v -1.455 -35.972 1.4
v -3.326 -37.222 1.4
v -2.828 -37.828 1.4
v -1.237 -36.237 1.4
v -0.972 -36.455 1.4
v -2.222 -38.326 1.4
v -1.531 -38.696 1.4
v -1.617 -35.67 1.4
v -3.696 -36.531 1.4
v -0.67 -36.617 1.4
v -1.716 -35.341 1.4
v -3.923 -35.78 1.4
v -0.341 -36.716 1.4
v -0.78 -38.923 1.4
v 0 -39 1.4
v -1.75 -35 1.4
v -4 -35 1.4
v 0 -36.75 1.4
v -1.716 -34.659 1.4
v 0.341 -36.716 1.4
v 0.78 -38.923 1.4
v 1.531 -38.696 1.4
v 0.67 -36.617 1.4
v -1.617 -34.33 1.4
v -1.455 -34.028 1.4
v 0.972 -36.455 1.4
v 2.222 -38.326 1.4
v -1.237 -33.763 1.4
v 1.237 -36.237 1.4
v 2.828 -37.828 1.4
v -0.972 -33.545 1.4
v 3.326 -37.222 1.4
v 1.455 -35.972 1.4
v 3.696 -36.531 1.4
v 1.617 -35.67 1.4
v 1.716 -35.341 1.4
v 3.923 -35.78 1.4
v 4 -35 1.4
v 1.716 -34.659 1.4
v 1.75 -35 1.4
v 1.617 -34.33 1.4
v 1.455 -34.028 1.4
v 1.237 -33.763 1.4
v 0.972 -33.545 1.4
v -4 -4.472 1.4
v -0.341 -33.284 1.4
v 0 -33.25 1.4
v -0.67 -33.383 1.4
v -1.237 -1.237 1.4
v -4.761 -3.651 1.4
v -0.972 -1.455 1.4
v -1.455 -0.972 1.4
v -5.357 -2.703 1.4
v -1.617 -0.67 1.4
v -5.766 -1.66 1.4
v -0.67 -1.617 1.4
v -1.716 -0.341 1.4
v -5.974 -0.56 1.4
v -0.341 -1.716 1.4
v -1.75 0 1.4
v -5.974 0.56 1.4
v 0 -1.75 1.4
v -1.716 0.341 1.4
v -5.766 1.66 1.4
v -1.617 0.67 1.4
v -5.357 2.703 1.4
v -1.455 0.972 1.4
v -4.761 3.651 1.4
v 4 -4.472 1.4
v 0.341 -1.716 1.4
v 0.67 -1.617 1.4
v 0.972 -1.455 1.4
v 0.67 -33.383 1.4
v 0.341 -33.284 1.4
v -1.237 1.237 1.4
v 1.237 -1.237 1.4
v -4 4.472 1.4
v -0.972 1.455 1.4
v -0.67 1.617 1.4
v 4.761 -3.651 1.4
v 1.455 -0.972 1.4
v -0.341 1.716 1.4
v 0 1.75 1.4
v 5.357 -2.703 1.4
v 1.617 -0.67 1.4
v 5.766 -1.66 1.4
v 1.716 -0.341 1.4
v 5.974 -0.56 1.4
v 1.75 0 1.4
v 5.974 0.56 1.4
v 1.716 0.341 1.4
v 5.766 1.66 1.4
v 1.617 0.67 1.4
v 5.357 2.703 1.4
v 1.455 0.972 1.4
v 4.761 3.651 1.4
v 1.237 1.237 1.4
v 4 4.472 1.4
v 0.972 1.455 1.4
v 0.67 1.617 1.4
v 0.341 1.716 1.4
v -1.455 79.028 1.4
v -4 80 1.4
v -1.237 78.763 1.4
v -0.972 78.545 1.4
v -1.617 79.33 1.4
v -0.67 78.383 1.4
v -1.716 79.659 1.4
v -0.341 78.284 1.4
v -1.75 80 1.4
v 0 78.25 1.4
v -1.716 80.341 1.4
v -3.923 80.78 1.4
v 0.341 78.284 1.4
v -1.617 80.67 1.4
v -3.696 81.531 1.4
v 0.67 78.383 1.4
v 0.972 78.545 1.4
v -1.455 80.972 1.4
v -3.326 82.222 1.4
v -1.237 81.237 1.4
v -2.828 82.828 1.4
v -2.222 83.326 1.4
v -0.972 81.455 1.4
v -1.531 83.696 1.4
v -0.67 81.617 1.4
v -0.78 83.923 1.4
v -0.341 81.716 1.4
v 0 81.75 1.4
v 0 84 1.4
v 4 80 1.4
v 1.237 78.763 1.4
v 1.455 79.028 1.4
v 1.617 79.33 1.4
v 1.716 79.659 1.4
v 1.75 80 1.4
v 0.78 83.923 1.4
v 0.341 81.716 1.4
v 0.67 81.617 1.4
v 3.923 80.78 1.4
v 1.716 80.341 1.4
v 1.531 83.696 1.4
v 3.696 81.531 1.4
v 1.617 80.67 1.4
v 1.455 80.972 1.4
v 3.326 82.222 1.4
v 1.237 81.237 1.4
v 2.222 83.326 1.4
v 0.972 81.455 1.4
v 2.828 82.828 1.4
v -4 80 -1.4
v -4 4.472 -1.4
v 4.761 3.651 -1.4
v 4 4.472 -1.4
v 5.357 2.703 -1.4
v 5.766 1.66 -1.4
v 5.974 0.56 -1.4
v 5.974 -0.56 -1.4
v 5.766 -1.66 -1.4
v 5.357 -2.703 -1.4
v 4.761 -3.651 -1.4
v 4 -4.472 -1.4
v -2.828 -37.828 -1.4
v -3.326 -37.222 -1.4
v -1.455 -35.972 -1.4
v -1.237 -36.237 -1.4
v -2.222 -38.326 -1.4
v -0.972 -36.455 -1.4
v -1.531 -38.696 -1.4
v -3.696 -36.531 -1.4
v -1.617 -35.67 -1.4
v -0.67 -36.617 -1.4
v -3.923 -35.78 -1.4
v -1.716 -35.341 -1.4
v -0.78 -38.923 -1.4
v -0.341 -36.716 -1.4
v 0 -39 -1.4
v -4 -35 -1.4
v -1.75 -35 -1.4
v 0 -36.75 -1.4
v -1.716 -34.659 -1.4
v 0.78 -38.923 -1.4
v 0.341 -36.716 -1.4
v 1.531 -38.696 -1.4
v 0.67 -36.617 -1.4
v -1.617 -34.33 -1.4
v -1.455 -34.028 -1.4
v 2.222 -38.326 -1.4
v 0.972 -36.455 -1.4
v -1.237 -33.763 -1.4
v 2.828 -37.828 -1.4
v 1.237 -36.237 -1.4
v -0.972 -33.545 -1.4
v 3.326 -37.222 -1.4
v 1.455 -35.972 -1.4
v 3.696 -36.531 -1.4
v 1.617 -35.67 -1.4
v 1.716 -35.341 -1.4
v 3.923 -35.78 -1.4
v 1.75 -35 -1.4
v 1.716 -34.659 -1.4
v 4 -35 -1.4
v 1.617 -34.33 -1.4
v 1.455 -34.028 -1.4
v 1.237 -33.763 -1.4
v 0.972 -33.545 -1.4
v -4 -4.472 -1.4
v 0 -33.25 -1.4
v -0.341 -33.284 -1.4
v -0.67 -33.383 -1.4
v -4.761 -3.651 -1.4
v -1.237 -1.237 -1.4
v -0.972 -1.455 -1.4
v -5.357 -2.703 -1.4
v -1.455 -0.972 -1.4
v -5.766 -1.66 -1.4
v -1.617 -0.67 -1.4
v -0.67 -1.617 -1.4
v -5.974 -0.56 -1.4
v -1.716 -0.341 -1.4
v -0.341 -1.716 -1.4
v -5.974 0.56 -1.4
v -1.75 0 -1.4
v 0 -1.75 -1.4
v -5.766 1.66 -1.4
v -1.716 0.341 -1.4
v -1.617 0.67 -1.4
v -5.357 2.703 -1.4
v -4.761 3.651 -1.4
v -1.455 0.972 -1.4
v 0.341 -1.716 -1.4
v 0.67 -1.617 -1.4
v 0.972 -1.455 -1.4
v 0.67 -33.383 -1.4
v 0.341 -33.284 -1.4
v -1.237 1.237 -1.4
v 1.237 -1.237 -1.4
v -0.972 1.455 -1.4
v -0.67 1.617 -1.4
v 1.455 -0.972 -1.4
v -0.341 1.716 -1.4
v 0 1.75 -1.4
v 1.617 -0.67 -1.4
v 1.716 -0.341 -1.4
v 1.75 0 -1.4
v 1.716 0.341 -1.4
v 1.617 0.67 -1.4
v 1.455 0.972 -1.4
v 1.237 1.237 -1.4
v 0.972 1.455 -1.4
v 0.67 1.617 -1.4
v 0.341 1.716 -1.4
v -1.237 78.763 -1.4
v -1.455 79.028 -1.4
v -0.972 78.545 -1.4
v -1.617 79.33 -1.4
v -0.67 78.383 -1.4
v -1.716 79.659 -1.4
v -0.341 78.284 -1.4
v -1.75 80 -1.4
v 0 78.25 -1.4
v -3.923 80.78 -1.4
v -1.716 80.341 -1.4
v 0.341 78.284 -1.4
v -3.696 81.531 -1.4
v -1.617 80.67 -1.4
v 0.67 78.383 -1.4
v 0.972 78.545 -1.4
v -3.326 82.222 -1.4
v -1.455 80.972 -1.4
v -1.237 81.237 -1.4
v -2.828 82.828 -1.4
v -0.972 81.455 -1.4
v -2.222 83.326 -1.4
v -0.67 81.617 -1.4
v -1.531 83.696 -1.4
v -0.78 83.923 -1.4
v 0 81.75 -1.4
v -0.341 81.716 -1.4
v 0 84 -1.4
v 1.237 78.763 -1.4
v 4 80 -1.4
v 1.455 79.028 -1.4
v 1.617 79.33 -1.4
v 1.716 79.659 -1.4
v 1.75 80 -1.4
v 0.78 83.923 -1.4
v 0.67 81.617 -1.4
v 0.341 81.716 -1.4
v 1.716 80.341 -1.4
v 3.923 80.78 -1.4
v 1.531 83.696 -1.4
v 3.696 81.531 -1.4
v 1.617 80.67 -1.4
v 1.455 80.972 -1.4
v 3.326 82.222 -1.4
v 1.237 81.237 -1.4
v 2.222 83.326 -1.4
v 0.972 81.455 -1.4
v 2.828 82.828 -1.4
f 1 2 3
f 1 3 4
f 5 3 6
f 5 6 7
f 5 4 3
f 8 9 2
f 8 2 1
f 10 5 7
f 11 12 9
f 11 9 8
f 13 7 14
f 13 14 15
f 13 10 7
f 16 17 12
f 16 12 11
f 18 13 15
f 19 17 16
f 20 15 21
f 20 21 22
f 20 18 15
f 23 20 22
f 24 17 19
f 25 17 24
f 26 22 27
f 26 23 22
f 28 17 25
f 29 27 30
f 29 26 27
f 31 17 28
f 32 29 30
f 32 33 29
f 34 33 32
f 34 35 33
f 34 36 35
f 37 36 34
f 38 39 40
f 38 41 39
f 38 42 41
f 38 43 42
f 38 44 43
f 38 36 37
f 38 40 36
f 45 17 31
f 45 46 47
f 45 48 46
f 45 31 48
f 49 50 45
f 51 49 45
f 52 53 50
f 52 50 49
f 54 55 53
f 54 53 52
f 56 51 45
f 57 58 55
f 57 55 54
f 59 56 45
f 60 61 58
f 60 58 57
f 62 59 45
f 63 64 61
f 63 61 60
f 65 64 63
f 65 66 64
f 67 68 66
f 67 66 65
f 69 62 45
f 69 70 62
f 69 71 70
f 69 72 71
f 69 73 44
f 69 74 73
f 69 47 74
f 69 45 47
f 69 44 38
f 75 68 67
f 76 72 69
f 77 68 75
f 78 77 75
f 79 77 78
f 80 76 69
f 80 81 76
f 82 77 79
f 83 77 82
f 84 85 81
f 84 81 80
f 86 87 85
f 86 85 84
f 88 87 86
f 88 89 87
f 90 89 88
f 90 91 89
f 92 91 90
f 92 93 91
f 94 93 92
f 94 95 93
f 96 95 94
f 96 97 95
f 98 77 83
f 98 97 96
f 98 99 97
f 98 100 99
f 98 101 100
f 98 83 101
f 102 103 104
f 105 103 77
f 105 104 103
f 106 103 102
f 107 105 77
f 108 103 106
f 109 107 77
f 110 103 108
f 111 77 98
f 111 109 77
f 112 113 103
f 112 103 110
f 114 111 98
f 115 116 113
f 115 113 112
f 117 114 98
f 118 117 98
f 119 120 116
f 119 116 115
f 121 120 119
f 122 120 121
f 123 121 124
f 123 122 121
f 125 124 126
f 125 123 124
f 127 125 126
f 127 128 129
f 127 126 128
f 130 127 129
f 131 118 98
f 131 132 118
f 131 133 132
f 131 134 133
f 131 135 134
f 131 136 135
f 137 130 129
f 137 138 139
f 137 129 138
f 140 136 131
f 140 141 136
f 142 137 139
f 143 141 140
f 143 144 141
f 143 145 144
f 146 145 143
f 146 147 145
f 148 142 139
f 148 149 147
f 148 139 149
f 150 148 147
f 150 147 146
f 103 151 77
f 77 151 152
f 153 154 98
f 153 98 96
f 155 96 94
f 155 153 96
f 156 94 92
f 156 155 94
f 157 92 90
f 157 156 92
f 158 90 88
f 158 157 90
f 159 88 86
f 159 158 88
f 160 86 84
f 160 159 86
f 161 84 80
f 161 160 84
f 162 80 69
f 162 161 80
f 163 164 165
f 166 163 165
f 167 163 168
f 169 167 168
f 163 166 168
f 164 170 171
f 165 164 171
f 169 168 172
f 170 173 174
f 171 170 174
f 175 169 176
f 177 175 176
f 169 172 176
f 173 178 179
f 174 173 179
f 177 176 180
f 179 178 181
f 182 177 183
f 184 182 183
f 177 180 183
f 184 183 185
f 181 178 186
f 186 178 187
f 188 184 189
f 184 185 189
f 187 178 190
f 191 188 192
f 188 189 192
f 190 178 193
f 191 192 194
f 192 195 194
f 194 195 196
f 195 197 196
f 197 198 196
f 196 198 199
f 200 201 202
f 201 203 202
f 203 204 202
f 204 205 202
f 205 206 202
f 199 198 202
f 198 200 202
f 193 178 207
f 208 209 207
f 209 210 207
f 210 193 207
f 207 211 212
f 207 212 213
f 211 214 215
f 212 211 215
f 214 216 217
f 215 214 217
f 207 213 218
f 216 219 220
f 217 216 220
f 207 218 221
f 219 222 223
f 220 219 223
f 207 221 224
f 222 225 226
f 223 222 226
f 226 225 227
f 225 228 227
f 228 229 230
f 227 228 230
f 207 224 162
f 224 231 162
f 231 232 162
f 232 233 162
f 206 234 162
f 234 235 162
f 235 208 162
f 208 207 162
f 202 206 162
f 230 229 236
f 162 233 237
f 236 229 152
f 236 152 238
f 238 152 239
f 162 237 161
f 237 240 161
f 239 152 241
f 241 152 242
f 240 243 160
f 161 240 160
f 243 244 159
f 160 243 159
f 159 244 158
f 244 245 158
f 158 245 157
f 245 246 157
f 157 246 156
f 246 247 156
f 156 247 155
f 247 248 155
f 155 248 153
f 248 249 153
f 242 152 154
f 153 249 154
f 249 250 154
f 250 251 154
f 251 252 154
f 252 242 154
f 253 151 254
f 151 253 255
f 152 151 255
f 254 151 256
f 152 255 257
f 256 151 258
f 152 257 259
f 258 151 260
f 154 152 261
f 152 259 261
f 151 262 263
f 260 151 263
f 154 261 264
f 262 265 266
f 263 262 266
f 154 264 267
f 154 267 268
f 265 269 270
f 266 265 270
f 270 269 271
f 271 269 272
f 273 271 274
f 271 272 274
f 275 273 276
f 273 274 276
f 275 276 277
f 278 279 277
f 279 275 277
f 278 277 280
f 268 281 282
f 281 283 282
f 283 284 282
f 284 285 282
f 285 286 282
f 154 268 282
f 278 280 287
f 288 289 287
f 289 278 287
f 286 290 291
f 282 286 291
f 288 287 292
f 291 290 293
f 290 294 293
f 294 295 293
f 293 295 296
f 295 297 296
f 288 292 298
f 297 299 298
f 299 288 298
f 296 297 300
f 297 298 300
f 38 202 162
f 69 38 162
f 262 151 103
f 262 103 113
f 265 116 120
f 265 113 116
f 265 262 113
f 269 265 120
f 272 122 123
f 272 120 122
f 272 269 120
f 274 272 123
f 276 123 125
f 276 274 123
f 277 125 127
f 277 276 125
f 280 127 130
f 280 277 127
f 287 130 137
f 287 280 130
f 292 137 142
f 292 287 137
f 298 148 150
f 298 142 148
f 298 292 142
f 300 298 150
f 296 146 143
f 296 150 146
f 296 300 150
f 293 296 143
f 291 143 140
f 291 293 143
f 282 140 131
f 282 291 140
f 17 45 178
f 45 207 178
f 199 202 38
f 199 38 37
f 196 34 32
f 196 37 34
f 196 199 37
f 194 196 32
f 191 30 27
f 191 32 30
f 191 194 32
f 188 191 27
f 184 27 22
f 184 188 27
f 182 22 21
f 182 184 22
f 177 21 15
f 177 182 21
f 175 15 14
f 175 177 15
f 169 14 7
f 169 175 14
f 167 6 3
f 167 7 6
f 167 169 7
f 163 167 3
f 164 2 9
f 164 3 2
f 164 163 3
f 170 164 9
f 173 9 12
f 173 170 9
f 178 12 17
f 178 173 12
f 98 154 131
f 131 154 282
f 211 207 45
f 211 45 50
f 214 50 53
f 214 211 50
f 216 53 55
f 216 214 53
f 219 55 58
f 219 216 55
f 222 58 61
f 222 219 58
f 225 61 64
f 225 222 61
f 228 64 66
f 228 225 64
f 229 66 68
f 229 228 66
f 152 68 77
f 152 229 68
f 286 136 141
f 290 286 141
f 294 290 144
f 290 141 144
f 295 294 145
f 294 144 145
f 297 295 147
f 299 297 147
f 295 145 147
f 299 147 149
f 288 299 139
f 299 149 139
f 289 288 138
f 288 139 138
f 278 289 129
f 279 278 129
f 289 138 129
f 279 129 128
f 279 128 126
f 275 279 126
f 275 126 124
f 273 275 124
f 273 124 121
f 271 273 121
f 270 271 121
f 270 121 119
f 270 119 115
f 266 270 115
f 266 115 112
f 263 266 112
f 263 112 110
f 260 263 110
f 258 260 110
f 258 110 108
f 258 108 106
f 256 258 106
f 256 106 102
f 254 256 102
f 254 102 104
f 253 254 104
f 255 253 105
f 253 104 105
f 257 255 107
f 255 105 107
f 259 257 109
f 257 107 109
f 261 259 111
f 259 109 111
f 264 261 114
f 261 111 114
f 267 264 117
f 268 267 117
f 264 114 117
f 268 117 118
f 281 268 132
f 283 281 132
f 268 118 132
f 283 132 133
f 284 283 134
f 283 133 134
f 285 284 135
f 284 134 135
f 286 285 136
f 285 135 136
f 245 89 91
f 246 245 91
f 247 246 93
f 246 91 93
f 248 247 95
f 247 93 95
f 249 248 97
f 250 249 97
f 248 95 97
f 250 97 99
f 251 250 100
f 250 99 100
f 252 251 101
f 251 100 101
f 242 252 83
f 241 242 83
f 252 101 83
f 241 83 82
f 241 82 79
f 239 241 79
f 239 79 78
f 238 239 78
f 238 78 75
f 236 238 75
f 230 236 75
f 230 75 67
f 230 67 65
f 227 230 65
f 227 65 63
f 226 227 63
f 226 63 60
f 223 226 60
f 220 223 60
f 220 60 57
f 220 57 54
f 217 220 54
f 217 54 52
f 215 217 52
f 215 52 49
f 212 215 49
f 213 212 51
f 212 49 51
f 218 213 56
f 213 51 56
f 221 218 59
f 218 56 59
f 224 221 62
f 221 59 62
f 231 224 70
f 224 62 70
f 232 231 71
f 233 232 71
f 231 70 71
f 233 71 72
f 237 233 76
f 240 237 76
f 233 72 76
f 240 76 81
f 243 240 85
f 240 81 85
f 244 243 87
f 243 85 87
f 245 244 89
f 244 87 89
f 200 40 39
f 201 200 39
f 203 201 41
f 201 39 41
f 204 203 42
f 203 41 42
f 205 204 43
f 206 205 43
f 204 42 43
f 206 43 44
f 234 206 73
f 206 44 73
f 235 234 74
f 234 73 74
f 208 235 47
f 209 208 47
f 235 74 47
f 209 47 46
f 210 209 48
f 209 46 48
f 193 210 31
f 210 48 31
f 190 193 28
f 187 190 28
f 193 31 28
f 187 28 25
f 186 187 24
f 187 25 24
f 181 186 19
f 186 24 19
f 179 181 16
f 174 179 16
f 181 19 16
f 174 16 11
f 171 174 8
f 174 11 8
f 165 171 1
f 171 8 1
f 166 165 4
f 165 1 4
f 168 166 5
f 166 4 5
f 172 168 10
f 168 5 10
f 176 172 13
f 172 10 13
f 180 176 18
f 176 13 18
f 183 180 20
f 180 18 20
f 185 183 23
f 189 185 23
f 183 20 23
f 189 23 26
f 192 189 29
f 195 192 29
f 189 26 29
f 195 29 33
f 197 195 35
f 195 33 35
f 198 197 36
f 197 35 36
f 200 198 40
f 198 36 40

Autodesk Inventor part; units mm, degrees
ref_plane "YZ Plane" through (0, 0, 0) normal (1, 0, 0) x (0, 1, 0)
ref_plane "XZ Plane" through (0, 0, 0) normal (0, 1, 0) x (-1, 0, 0)
ref_plane "XY Plane" through (0, 0, 0) normal (0, 0, 1) x (1, 0, 0)
sketch "Sketch1" plane through (0, 0, 0) normal (0, 0, 1) x (1, 0, 0)
  circle A0 centre (0, 0) radius 6
  line L0 (0, -35) -> (0, 80) construction
  line L1 (4, -35) -> (4, 80)
  line L2 (-4, 80) -> (-4, -35)
  arc A1 (-4, -35) -> (4, -35) centre (0, -35) ccw
  arc A2 (4, 80) -> (-4, 80) centre (0, 80) ccw
  point P0 (0, 22.5)
  dimension "d0" = 12
  dimension "d1" = 8
  dimension "d2" = 80
  dimension "d12" = 35
extrude "Extrusion1" add sketch "Sketch1" along normal mid plane 2.8
sketch "Sketch2" plane through (0, 0, 1.4) normal (0, 0, 1) x (1, 0, 0)
  arc A0 (4, 80) -> (-4, 80) centre (0, 80) ccw construction
  arc A1 (-4, 4.4721) -> (4, 4.4721) centre (0, 0) ccw construction
  circle A2 centre (0, 0) radius 1.75
  circle A3 centre (0, 80) radius 1.75
  line L0 (0, 12.7) -> (0, 5.7) construction
  line L1 (-1.3, 11.4) -> (-1.3, 7)
  line L2 (1.3, 7) -> (1.3, 11.4)
  arc A4 (1.3, 11.4) -> (-1.3, 11.4) centre (0, 11.4) ccw
  arc A5 (-1.3, 7) -> (1.3, 7) centre (0, 7) ccw
  arc A6 (-4, -35) -> (4, -35) centre (0, -35) ccw construction
  circle A7 centre (0, -35) radius 1.75
  point P0 (0, 9.2)
  dimension "d5" = 7
  dimension "d6" = 2.6
  dimension "d7" = 7
  dimension "d8" = 3.5
  dimension "d9" = 3.5
  dimension "d13" = 3.5
extrude "Extrusion2" cut sketch "Sketch2" against normal blind 3.5 contours A2 | A3 | A7
equation "\"d10\" = d13"
